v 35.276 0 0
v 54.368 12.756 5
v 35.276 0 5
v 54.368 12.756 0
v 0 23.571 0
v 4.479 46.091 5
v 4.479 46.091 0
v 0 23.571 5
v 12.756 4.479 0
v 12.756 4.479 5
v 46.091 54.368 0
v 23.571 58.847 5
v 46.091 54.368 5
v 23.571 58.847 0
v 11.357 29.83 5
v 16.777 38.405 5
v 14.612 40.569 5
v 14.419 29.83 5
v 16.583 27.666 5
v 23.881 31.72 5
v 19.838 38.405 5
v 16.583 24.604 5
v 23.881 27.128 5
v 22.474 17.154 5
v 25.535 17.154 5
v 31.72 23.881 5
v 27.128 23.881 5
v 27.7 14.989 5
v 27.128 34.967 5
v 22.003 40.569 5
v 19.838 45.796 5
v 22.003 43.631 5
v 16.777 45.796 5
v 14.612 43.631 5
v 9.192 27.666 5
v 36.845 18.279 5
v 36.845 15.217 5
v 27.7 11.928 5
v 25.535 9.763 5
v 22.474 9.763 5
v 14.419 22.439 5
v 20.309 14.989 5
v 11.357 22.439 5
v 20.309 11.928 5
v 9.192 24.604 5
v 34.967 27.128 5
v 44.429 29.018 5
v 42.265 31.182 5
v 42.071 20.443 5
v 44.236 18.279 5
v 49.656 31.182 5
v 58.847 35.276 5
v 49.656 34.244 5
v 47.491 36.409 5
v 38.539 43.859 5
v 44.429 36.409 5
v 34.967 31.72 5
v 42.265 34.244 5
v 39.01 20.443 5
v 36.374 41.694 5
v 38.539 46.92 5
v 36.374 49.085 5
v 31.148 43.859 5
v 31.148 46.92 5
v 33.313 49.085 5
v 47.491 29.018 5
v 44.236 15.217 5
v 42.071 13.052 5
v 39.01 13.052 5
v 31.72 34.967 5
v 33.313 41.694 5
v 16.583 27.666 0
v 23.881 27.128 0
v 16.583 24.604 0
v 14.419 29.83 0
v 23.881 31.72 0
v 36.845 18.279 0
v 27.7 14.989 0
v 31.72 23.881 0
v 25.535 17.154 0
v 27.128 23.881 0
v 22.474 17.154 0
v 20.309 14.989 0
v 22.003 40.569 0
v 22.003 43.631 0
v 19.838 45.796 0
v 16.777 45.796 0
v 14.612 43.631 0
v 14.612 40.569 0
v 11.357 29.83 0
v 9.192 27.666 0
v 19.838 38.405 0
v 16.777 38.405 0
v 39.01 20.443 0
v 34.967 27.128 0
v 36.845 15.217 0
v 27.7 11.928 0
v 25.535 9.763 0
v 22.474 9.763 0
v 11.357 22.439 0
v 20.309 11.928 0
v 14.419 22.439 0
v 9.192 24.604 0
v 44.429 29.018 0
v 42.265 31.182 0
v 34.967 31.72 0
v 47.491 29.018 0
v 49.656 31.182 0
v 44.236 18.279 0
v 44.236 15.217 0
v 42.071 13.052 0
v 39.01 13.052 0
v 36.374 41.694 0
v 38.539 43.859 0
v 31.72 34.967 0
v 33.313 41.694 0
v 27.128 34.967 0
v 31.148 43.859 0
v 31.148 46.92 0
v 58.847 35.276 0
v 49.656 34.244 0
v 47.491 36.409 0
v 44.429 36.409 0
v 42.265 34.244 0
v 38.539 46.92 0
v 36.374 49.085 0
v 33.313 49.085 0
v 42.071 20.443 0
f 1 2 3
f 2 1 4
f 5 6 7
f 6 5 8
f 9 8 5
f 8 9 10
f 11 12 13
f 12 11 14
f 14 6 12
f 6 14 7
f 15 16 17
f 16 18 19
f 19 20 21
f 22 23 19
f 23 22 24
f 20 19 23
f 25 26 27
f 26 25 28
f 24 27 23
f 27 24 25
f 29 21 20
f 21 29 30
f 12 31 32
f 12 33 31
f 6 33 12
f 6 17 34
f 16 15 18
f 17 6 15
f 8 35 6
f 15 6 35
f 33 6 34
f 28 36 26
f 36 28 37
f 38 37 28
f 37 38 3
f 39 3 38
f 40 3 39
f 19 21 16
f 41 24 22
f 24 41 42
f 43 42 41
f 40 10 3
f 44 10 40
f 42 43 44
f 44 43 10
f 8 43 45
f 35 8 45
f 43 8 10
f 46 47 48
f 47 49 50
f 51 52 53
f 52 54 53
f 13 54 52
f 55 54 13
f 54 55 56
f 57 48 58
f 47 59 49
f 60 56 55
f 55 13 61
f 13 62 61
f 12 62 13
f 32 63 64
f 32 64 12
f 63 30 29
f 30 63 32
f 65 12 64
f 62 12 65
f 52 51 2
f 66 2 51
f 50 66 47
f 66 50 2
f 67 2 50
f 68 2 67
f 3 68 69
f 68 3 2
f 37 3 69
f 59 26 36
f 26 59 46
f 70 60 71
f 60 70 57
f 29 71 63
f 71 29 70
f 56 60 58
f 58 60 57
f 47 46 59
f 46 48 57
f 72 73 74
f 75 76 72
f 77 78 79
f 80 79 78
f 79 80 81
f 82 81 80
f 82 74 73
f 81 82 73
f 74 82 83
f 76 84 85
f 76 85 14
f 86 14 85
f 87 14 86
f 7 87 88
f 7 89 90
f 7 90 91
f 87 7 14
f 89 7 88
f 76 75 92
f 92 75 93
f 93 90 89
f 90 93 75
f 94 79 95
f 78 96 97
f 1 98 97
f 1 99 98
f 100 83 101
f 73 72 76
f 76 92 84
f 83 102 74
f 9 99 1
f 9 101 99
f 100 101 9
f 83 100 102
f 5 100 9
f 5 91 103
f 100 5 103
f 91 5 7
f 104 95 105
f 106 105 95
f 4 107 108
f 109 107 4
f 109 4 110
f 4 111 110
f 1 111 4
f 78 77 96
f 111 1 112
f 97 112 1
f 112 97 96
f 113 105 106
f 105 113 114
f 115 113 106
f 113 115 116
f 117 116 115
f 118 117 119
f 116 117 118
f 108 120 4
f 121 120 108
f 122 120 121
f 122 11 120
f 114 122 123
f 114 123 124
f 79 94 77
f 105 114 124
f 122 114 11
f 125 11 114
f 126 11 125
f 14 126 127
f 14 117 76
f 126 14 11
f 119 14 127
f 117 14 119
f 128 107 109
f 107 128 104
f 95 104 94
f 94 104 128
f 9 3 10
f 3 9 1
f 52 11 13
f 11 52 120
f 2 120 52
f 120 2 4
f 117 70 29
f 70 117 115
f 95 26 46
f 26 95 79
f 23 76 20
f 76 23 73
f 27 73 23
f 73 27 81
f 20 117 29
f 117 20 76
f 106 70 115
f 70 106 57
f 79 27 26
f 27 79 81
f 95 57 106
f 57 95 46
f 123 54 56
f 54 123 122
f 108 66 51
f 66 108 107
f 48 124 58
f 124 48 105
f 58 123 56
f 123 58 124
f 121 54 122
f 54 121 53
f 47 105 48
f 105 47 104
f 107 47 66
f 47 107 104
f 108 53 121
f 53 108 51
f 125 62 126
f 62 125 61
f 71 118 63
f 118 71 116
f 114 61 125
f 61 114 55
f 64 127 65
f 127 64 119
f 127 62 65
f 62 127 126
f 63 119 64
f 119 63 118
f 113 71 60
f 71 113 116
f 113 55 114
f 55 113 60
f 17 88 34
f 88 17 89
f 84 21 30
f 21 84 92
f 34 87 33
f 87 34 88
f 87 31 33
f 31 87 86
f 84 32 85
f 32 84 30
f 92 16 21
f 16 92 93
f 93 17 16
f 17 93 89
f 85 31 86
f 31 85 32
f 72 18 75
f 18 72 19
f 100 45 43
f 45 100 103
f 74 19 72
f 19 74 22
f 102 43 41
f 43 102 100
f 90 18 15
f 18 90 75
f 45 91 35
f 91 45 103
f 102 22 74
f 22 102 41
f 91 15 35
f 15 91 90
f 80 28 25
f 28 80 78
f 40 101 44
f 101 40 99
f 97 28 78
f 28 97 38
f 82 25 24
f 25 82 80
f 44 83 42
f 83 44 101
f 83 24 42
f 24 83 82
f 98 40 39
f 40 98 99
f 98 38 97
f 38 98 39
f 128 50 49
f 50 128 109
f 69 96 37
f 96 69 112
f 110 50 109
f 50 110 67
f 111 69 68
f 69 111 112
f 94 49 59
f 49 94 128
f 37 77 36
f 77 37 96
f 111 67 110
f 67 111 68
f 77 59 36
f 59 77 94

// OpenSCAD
$fn = 32;

// ----------------------------------------------------------------------
// Polygon plate: 8-gon R30, 6 bolt windows
// ----------------------------------------------------------------------

// --- parameters (mm) ---
sides = 8;                // number of polygon sides
plate_r = 30;             // circumscribed radius of the polygon
bore_r = 6;               // centre bore radius
bolts = 6;                // number of bolt windows
ring_r = 16.86;           // bolt-circle radius
bolt_r = 4;               // bolt window radius
plate_t = 5;              // plate thickness, Z (extrusion height)

plate_d = 2 * plate_r;  // circumscribed diameter
bore_d = 2 * bore_r;  // centre bore diameter
bolt_d = 2 * bolt_r;  // bolt window diameter
ring_d = 2 * ring_r;  // bolt-circle diameter

profile = [[58.847, 35.276], [46.091, 54.368], [23.571, 58.847], [4.479, 46.091], [0, 23.571], [12.756, 4.479], [35.276, 0], [54.368, 12.756]];  // primary outline, 8 points, counter clockwise
void_1 = [[34.967, 31.72], [31.72, 34.967], [27.128, 34.967], [23.881, 31.72], [23.881, 27.128], [27.128, 23.881], [31.72, 23.881], [34.967, 27.128]];  // centre bore, 8 points
void_2 = [[49.656, 34.244], [47.491, 36.409], [44.429, 36.409], [42.265, 34.244], [42.265, 31.182], [44.429, 29.018], [47.491, 29.018], [49.656, 31.182]];  // bolt window 1, 8 points
void_3 = [[38.539, 46.92], [36.374, 49.085], [33.313, 49.085], [31.148, 46.92], [31.148, 43.859], [33.313, 41.694], [36.374, 41.694], [38.539, 43.859]];  // bolt window 2, 8 points
void_4 = [[22.003, 43.631], [19.838, 45.796], [16.777, 45.796], [14.612, 43.631], [14.612, 40.569], [16.777, 38.405], [19.838, 38.405], [22.003, 40.569]];  // bolt window 3, 8 points
void_5 = [[16.583, 27.666], [14.419, 29.83], [11.357, 29.83], [9.192, 27.666], [9.192, 24.604], [11.357, 22.439], [14.419, 22.439], [16.583, 24.604]];  // bolt window 4, 8 points
void_6 = [[27.7, 14.989], [25.535, 17.154], [22.474, 17.154], [20.309, 14.989], [20.309, 11.928], [22.474, 9.763], [25.535, 9.763], [27.7, 11.928]];  // bolt window 5, 8 points
void_7 = [[44.236, 18.279], [42.071, 20.443], [39.01, 20.443], [36.845, 18.279], [36.845, 15.217], [39.01, 13.052], [42.071, 13.052], [44.236, 15.217]];  // bolt window 6, 8 points

// --- the one profile operation ---
difference() {
  linear_extrude(height = plate_t) polygon(points = profile);
  translate([0, 0, -1])
    linear_extrude(height = plate_t + 2) polygon(points = void_1);
  translate([0, 0, -1])
    linear_extrude(height = plate_t + 2) polygon(points = void_2);
  translate([0, 0, -1])
    linear_extrude(height = plate_t + 2) polygon(points = void_3);
  translate([0, 0, -1])
    linear_extrude(height = plate_t + 2) polygon(points = void_4);
  translate([0, 0, -1])
    linear_extrude(height = plate_t + 2) polygon(points = void_5);
  translate([0, 0, -1])
    linear_extrude(height = plate_t + 2) polygon(points = void_6);
  translate([0, 0, -1])
    linear_extrude(height = plate_t + 2) polygon(points = void_7);
}
